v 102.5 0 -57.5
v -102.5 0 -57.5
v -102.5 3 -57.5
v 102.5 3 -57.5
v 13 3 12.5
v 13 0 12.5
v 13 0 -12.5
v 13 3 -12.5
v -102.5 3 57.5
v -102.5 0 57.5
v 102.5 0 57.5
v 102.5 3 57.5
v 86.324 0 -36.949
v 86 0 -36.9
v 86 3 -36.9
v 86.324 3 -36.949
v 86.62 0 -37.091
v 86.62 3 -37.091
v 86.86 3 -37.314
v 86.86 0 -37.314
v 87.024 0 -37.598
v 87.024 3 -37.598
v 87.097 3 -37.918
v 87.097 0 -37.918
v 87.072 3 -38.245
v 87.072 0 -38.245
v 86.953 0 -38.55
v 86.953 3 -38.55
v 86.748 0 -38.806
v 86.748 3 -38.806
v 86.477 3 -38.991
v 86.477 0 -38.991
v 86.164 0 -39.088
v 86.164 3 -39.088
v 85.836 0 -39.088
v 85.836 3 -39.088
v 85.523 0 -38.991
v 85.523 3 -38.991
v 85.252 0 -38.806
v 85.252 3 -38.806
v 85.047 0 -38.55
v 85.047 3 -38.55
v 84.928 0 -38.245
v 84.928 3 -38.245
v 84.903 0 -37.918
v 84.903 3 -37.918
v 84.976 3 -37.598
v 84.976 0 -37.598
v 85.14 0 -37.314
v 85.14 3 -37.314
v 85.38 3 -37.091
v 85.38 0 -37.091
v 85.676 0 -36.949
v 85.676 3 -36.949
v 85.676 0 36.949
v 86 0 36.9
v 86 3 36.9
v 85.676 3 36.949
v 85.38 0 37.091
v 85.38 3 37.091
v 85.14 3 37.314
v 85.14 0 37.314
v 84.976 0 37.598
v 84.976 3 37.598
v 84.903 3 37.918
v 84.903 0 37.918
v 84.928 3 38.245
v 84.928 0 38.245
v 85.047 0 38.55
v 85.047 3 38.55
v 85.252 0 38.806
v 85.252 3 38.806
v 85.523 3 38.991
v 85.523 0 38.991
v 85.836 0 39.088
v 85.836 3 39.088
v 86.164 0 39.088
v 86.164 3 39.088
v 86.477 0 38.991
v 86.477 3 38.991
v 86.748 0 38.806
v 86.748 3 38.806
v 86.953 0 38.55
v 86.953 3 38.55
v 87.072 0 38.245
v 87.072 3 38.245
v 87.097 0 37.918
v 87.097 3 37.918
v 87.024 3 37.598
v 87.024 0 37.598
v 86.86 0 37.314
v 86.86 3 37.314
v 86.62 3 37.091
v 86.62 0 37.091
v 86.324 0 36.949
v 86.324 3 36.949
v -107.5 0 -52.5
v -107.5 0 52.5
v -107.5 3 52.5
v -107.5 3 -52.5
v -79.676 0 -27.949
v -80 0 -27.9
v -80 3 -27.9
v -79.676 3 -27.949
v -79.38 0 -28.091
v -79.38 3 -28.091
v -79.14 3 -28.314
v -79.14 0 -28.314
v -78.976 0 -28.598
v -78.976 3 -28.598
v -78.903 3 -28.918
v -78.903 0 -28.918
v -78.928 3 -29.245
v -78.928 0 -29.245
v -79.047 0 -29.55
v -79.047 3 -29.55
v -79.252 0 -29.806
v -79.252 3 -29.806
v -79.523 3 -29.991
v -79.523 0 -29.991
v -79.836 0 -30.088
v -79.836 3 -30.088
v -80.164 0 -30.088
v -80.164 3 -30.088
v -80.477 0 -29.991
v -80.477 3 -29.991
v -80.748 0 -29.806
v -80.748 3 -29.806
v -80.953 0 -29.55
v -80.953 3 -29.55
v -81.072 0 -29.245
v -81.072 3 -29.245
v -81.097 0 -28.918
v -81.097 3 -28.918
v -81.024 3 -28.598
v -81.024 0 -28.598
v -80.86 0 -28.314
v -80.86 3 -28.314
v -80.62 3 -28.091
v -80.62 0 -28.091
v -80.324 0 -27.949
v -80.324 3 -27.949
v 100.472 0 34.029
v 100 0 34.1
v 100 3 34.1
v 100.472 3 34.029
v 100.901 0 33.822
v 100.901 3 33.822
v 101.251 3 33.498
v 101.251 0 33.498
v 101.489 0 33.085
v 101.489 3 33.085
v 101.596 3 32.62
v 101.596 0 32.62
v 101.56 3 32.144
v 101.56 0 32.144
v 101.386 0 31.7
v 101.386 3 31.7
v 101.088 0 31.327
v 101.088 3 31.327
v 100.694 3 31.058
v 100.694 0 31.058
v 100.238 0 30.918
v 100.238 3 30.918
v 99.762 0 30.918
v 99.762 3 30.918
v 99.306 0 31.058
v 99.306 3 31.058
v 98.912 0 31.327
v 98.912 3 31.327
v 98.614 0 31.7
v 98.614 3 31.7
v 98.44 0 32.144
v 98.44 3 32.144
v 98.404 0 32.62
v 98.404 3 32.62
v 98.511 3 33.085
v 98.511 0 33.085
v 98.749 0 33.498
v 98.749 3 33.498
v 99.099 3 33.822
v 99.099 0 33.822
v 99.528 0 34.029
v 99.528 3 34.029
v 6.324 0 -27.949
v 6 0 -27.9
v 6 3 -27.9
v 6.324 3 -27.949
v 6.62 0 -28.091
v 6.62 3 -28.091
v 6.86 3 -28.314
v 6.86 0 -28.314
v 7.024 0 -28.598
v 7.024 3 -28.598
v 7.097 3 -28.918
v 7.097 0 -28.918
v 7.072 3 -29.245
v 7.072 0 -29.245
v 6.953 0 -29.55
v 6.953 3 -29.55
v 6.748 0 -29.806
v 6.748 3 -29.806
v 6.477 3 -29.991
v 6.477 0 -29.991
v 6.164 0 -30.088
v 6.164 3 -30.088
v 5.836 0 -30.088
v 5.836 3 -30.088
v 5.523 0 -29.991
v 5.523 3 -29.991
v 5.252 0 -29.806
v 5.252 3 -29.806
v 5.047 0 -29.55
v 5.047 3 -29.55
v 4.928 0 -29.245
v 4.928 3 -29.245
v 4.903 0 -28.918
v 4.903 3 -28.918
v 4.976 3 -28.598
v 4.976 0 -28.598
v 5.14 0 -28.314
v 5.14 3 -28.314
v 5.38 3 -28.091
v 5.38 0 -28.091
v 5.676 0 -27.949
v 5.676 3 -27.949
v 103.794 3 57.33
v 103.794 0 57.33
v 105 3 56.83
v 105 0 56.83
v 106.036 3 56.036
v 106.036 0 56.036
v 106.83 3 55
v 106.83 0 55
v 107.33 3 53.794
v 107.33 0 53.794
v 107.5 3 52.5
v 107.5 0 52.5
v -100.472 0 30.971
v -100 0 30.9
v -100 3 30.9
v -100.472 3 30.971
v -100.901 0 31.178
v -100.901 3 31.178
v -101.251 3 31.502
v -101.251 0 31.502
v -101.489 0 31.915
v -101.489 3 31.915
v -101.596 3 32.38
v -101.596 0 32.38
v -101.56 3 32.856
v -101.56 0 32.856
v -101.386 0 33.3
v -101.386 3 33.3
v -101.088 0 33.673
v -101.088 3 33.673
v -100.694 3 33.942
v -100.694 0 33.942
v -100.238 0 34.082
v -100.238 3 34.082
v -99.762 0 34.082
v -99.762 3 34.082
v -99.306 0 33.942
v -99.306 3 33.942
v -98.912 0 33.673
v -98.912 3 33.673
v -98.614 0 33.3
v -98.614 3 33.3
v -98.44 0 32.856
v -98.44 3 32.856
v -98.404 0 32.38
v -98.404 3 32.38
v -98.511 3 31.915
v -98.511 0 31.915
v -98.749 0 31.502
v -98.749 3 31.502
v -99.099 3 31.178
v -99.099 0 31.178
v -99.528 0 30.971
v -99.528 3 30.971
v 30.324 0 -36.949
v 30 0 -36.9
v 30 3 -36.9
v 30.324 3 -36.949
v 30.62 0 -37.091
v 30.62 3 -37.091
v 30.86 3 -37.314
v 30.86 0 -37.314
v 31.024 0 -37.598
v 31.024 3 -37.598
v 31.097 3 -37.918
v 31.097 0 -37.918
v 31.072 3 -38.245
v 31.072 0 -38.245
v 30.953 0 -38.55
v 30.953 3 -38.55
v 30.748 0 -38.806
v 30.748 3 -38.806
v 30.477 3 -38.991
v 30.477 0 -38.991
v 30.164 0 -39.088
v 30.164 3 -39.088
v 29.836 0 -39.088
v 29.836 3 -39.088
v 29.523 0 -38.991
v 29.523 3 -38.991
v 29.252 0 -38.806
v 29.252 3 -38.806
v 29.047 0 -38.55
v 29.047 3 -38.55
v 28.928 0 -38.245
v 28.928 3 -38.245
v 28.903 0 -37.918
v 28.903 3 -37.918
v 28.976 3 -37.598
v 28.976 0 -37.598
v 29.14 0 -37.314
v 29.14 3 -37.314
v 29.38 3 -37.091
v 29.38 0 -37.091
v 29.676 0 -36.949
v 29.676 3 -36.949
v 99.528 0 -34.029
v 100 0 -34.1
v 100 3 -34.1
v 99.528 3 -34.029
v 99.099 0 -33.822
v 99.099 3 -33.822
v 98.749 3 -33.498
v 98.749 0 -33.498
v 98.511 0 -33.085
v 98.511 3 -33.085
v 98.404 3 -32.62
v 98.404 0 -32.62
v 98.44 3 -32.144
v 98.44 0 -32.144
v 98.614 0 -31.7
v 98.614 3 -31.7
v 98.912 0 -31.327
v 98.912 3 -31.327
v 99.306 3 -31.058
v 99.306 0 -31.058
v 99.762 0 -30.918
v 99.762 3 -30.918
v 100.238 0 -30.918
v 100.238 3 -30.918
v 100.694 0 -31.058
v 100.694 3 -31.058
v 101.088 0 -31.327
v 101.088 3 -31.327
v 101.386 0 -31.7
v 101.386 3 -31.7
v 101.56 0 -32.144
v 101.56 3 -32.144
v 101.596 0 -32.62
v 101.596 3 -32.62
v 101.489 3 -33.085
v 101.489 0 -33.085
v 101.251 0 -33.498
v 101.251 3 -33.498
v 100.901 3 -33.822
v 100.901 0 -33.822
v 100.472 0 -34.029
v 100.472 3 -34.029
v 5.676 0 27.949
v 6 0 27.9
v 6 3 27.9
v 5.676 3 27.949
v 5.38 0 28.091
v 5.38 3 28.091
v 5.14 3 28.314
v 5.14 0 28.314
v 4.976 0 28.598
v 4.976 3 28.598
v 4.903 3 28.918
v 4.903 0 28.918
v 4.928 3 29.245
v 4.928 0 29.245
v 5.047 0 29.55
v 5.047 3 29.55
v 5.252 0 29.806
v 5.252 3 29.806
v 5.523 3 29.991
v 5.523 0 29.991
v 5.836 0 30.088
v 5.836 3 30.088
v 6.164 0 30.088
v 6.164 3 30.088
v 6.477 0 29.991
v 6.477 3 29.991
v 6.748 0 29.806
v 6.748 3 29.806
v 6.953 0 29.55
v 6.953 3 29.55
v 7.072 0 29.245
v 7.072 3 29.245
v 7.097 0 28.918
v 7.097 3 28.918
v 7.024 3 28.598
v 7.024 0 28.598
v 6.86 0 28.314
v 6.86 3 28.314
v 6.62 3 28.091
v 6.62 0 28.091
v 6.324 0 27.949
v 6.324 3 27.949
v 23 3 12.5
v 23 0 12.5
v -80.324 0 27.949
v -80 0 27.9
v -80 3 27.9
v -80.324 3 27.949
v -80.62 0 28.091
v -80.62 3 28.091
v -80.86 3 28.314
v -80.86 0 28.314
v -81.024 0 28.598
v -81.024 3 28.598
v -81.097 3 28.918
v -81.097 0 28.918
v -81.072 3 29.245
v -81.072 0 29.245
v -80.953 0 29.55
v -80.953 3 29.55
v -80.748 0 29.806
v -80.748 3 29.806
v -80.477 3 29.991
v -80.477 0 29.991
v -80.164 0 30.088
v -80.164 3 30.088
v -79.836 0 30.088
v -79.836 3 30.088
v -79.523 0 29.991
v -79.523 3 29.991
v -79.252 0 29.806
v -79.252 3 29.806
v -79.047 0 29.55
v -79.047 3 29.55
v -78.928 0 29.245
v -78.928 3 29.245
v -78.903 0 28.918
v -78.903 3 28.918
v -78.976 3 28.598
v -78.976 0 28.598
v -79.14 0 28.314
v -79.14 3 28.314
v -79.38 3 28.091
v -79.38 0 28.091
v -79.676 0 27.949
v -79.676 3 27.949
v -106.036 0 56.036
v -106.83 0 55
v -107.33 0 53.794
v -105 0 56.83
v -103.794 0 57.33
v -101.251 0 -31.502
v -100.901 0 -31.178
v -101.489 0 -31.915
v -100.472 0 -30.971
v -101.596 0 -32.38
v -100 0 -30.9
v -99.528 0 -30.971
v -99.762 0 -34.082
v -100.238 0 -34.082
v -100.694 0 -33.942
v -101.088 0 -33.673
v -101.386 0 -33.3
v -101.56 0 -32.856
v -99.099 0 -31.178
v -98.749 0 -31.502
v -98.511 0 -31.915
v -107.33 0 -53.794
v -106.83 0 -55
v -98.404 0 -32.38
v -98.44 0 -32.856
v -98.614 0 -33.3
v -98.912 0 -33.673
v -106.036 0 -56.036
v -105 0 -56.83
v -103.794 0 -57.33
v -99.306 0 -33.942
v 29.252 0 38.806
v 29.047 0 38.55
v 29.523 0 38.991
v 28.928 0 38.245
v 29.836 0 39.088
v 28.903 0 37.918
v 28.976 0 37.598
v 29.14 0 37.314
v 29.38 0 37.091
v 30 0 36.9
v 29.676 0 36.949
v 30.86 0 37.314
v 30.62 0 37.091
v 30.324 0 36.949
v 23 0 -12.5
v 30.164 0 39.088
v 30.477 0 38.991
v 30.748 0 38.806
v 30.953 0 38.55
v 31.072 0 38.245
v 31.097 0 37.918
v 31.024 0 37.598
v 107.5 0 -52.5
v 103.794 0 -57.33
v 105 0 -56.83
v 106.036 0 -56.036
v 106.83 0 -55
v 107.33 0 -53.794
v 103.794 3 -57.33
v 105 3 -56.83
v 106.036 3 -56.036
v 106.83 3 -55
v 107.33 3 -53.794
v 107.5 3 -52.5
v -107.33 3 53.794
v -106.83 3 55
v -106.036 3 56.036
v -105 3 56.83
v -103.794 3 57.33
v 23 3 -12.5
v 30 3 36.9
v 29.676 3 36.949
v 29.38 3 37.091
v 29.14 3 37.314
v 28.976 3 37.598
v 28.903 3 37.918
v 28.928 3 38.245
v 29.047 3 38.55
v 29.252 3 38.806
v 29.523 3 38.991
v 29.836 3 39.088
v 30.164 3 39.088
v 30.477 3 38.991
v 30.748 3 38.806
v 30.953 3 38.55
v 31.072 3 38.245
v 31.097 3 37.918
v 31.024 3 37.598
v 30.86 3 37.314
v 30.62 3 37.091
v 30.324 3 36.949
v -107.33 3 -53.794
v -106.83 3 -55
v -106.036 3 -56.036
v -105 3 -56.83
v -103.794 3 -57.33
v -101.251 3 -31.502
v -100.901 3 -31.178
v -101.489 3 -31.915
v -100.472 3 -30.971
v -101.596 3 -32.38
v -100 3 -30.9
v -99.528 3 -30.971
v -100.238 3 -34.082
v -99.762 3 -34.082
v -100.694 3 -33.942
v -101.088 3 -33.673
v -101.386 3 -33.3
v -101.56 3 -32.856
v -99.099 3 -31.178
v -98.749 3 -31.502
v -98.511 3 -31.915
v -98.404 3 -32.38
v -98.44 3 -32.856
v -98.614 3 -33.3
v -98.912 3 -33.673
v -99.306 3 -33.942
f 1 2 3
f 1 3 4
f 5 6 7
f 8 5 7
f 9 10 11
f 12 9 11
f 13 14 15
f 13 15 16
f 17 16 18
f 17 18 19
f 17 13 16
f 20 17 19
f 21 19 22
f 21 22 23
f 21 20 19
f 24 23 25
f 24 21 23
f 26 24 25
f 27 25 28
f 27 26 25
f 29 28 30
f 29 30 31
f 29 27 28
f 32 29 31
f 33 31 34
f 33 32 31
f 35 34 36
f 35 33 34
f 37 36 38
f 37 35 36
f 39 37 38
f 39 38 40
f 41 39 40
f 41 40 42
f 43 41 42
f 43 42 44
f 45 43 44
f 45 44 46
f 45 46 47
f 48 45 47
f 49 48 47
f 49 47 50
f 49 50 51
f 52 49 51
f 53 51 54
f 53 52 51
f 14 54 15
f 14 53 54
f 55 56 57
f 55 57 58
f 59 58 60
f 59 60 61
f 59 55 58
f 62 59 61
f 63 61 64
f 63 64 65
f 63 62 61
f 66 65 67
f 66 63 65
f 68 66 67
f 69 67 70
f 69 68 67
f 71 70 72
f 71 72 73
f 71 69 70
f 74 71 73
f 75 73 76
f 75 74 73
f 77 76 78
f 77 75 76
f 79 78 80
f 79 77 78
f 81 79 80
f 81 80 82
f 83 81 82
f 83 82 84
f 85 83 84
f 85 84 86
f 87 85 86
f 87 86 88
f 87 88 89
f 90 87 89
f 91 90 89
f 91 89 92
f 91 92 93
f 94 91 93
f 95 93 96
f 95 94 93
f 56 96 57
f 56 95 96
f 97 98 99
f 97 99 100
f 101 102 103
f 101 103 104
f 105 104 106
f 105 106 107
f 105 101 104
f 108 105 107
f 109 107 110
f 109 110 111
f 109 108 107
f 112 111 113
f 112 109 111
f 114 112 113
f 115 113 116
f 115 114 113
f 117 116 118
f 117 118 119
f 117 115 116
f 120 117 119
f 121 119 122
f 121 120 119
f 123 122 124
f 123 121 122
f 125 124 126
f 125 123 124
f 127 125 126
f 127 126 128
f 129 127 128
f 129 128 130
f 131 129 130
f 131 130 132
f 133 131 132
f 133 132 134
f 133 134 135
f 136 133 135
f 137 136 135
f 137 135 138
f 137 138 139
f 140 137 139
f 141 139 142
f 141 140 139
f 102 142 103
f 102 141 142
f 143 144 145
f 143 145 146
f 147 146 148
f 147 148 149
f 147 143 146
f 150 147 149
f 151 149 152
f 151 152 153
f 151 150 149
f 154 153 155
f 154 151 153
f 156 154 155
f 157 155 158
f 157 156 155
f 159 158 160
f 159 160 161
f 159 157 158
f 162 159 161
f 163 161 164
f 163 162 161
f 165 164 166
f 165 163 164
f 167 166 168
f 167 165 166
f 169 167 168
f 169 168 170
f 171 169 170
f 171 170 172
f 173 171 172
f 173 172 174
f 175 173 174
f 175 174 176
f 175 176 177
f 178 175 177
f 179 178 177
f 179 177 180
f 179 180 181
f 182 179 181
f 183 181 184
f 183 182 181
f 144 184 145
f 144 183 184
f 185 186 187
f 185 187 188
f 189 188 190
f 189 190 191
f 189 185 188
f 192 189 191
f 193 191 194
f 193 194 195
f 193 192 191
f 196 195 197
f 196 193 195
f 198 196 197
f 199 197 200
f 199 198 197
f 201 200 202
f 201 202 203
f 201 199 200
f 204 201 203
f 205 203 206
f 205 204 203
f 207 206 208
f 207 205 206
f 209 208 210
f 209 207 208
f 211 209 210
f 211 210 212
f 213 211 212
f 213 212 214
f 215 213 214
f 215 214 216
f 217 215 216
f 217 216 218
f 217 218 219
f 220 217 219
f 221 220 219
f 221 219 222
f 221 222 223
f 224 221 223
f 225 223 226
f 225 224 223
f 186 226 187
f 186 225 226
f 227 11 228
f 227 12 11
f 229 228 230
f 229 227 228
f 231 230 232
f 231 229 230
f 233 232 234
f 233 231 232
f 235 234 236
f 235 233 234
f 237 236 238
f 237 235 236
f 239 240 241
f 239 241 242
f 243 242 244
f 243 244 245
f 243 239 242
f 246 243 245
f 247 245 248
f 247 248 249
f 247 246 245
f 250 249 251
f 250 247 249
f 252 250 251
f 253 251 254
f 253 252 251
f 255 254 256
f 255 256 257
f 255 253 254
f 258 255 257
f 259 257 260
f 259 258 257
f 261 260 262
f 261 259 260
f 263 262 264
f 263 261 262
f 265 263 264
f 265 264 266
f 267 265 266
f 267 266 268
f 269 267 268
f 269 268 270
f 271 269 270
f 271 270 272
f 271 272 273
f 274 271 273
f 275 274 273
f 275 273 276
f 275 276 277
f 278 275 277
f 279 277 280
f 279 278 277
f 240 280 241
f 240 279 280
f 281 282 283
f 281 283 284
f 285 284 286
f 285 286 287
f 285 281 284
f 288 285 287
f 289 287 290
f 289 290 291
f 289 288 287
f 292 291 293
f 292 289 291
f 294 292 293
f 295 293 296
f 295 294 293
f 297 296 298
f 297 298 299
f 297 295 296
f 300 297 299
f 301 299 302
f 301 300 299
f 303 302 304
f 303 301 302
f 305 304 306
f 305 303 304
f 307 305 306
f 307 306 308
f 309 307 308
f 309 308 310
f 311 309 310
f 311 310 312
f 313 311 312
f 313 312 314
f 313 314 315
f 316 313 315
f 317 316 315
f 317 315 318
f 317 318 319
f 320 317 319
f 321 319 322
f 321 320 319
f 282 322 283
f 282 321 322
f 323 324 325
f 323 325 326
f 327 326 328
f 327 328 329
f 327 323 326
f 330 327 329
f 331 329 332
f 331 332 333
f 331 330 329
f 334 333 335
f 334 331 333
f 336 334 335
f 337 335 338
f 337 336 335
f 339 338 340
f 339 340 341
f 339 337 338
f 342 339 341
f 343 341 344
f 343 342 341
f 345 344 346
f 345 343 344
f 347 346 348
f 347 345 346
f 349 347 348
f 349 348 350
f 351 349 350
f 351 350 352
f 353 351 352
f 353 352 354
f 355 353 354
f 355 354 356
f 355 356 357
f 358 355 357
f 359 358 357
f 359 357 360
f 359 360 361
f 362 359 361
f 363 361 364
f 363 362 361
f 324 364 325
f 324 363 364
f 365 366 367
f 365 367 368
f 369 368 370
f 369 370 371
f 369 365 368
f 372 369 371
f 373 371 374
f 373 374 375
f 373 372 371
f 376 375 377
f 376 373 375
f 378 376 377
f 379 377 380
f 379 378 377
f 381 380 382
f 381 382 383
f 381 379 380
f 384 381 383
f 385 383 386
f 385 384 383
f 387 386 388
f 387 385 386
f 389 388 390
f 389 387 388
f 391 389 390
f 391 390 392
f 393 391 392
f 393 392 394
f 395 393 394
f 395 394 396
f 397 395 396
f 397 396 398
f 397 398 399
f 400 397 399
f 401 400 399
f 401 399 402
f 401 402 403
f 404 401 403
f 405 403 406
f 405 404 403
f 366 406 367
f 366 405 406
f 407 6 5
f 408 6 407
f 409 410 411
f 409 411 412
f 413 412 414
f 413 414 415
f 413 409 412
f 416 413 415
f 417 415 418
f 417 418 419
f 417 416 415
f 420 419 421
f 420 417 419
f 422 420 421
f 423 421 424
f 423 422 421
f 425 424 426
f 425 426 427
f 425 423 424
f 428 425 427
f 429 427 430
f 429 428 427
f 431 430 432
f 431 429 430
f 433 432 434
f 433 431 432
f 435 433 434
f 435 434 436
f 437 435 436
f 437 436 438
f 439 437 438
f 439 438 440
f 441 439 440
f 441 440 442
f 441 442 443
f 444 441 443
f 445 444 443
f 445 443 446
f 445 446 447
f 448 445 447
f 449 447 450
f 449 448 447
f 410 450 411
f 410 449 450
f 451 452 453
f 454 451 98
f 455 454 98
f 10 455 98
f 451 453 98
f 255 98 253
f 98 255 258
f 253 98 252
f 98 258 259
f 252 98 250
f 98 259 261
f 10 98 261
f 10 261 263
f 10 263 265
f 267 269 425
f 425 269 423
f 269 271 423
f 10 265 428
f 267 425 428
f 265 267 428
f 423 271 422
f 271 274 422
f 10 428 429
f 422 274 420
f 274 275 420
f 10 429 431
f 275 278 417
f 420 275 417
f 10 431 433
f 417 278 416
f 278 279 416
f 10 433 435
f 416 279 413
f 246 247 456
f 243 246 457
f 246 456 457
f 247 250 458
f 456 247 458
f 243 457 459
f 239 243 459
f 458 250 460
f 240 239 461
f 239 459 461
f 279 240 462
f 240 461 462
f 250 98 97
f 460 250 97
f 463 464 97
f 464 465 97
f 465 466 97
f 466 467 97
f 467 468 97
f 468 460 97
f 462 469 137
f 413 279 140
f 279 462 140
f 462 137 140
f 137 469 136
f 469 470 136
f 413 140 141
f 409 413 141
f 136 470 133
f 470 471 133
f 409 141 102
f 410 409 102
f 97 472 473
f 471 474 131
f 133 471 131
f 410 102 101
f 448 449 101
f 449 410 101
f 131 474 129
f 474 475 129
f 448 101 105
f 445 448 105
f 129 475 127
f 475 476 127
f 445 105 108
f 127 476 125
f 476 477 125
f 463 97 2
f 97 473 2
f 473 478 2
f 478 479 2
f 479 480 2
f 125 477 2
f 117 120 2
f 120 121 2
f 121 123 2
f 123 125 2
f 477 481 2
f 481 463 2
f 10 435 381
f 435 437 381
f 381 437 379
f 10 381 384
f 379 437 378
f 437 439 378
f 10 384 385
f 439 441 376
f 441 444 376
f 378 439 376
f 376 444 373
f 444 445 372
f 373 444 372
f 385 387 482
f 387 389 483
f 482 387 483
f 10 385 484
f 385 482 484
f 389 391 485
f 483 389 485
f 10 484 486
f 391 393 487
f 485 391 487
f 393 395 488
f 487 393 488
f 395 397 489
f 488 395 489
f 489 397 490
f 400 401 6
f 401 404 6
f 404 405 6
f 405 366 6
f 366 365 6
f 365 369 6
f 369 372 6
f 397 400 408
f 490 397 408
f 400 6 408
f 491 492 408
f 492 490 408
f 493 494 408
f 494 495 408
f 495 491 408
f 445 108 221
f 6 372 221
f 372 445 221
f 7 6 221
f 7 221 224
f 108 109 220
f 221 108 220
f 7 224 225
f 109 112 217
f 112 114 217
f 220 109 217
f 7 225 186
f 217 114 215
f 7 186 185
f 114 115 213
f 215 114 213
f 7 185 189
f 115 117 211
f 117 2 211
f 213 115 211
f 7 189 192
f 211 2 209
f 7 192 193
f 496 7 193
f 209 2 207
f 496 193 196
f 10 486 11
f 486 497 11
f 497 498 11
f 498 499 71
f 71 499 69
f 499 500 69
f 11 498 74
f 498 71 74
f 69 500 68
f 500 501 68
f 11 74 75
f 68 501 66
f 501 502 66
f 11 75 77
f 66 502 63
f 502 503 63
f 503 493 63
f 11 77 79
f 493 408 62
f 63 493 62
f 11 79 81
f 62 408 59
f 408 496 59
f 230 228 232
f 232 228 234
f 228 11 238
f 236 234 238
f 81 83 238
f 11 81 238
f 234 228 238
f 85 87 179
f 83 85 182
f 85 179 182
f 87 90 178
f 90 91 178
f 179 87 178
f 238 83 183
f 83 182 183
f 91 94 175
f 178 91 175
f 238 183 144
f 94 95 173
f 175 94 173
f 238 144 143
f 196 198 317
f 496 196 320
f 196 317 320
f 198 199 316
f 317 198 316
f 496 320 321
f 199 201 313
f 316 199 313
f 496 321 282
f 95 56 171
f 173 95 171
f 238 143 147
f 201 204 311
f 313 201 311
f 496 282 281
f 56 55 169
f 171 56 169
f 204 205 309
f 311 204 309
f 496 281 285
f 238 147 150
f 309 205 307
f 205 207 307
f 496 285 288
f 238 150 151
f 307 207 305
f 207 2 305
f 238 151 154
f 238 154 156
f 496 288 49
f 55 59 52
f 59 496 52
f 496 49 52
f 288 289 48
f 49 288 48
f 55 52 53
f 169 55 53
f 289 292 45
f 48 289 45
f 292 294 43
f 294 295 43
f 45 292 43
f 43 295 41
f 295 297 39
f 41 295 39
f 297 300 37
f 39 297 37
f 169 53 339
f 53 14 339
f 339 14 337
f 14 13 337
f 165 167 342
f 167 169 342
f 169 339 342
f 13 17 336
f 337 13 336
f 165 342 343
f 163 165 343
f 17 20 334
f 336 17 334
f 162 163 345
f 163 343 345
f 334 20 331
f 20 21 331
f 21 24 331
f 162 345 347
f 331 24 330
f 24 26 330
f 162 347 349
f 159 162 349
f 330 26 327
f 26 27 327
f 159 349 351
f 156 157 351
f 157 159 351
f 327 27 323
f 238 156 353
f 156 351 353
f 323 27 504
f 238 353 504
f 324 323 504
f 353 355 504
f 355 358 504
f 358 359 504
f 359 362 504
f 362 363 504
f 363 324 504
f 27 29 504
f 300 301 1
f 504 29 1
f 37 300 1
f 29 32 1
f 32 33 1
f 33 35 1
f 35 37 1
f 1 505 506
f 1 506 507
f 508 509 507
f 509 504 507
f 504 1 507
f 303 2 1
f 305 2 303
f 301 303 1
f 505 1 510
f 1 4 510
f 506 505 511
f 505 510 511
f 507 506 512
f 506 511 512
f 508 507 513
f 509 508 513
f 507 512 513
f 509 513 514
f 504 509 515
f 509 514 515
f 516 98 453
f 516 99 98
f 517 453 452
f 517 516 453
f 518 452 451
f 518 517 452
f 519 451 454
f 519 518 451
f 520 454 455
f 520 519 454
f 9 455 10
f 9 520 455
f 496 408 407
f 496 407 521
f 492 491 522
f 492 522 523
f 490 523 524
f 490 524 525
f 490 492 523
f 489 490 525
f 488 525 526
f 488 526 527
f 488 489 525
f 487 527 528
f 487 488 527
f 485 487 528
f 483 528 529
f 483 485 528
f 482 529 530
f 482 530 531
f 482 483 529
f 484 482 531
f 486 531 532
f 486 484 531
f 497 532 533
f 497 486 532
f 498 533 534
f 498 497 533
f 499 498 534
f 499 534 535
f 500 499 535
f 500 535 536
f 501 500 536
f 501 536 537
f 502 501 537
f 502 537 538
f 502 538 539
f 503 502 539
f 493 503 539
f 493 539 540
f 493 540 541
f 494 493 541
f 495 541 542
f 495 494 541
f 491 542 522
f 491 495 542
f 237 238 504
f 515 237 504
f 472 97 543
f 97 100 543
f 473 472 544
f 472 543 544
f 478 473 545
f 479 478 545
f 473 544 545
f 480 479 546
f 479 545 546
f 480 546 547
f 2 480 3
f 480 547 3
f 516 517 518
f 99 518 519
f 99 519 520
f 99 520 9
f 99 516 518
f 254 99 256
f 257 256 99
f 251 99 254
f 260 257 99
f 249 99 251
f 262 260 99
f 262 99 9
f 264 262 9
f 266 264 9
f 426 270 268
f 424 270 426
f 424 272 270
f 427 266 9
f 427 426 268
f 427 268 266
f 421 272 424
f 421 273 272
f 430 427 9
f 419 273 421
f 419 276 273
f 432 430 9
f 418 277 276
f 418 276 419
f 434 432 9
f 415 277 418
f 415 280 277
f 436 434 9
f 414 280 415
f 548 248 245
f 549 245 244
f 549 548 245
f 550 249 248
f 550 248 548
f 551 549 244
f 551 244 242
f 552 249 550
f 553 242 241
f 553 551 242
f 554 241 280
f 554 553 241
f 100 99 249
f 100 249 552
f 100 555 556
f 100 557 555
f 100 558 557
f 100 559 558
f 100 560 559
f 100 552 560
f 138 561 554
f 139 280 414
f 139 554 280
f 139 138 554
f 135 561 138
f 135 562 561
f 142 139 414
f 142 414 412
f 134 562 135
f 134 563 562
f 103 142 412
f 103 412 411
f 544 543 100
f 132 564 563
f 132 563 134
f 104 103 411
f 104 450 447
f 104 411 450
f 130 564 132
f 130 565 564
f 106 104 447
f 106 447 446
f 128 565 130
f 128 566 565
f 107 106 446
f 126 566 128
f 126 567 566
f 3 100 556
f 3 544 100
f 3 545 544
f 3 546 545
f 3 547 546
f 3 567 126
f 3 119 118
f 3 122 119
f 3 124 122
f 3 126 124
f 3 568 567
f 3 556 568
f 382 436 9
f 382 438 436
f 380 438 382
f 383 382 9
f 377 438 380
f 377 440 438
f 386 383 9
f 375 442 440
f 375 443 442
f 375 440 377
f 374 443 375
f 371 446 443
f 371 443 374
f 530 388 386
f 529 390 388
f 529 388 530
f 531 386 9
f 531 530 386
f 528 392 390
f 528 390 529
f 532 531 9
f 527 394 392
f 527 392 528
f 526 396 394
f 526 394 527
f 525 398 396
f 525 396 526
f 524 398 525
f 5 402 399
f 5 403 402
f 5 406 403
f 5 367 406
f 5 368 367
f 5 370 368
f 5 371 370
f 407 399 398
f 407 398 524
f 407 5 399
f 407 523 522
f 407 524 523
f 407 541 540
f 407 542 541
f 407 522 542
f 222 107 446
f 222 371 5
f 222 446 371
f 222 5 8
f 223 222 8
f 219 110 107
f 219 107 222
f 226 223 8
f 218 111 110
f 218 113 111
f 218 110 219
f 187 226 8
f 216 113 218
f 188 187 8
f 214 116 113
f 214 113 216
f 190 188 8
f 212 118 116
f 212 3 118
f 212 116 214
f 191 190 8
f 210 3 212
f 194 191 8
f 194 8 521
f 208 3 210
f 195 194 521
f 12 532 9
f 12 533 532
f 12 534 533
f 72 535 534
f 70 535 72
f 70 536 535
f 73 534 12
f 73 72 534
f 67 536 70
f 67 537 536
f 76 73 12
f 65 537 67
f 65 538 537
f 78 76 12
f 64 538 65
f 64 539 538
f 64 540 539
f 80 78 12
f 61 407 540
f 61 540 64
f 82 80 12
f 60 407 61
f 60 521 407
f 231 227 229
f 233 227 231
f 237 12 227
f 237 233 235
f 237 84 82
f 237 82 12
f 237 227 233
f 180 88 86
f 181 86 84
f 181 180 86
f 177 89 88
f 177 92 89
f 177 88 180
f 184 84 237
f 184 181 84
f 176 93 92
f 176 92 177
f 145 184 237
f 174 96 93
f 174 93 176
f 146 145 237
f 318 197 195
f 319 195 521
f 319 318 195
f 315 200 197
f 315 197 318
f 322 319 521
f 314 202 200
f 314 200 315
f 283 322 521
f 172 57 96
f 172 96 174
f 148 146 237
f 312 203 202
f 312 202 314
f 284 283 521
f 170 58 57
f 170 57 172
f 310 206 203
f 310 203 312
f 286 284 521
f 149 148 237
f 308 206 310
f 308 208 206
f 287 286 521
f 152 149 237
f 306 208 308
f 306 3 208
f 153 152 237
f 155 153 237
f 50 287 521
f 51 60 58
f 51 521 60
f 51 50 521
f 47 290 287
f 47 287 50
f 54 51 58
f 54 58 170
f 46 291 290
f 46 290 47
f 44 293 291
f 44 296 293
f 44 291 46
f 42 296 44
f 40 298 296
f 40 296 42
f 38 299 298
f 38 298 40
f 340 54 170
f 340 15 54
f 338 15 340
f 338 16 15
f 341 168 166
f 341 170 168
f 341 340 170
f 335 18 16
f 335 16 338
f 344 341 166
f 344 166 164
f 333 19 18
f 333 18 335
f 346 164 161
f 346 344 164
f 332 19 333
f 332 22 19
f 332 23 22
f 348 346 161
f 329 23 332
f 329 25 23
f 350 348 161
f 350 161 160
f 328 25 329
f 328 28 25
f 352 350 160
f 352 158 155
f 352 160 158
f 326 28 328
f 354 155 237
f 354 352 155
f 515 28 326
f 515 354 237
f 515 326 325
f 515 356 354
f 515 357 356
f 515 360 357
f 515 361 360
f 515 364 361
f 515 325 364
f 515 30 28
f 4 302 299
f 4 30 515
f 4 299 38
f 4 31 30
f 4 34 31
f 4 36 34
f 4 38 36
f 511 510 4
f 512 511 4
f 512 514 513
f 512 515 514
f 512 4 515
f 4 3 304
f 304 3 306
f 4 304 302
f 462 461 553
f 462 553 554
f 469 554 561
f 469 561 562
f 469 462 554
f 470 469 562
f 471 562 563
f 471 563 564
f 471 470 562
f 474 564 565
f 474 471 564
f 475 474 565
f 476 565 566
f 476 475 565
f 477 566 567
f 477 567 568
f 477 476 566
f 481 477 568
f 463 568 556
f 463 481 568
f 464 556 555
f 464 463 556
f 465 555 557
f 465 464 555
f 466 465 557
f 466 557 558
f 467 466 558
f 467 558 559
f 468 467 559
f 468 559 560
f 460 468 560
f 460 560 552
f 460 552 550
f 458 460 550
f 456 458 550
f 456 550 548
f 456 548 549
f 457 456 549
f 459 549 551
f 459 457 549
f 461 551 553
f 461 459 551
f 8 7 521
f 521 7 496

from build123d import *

# Parameters (mm, degrees)
SKETCH1_W           = 215
SKETCH1_H           = 115
SKETCH1_R           = 1.6
SKETCH1_R_2         = 1.1
SKETCH1_W_2         = 10
SKETCH1_H_2         = 25
BOSS_EXTRUDE1_DEPTH = 3
FILLET1_R           = 5


with BuildPart() as part:
    # Sketch1 → Boss-Extrude1 (new body)
    with BuildSketch(Plane(origin=(0, 0, 0), x_dir=(1, 0, 0), z_dir=(0, 1, 0))):
        Rectangle(SKETCH1_W, SKETCH1_H)
        with Locations(Location((100, -32.5, 0), (0, 0, 270))):
            Circle(SKETCH1_R, mode=Mode.SUBTRACT)
        with Locations(Location((-100, -32.5, 0), (0, 0, 90))):
            Circle(SKETCH1_R, mode=Mode.SUBTRACT)
        with Locations(Location((100, 32.5, 0), (0, 0, 90))):
            Circle(SKETCH1_R, mode=Mode.SUBTRACT)
        with Locations(Location((-100, 32.5, 0), (0, 0, 270))):
            Circle(SKETCH1_R, mode=Mode.SUBTRACT)
        with Locations(Location((-80, 29, 0), (0, 0, 270))):
            Circle(SKETCH1_R_2, mode=Mode.SUBTRACT)
        with Locations(Location((-80, -29, 0), (0, 0, 90))):
            Circle(SKETCH1_R_2, mode=Mode.SUBTRACT)
        with Locations(Location((30, 38, 0), (0, 0, 270))):
            Circle(SKETCH1_R_2, mode=Mode.SUBTRACT)
        with Locations(Location((86, 38, 0), (0, 0, 270))):
            Circle(SKETCH1_R_2, mode=Mode.SUBTRACT)
        with Locations(Location((86, -38, 0), (0, 0, 90))):
            Circle(SKETCH1_R_2, mode=Mode.SUBTRACT)
        with Locations(Location((30, -38, 0), (0, 0, 90))):
            Circle(SKETCH1_R_2, mode=Mode.SUBTRACT)
        with Locations(Location((6, 29, 0), (0, 0, 270))):
            Circle(SKETCH1_R_2, mode=Mode.SUBTRACT)
        with Locations(Location((6, -29, 0), (0, 0, 90))):
            Circle(SKETCH1_R_2, mode=Mode.SUBTRACT)
        with Locations((18, 0)):
            Rectangle(SKETCH1_W_2, SKETCH1_H_2, mode=Mode.SUBTRACT)
    extrude(amount=BOSS_EXTRUDE1_DEPTH)

    # Fillet1
    fillet1_edges = [part.edges().sort_by_distance(p)[0] for p in [
        (107.5, 1.5, 57.5),
        (-107.5, 1.5, 57.5),
        (-107.5, 1.5, -57.5),
        (107.5, 1.5, -57.5),
    ]]
    fillet(fillet1_edges, radius=FILLET1_R)


solid = part.part
